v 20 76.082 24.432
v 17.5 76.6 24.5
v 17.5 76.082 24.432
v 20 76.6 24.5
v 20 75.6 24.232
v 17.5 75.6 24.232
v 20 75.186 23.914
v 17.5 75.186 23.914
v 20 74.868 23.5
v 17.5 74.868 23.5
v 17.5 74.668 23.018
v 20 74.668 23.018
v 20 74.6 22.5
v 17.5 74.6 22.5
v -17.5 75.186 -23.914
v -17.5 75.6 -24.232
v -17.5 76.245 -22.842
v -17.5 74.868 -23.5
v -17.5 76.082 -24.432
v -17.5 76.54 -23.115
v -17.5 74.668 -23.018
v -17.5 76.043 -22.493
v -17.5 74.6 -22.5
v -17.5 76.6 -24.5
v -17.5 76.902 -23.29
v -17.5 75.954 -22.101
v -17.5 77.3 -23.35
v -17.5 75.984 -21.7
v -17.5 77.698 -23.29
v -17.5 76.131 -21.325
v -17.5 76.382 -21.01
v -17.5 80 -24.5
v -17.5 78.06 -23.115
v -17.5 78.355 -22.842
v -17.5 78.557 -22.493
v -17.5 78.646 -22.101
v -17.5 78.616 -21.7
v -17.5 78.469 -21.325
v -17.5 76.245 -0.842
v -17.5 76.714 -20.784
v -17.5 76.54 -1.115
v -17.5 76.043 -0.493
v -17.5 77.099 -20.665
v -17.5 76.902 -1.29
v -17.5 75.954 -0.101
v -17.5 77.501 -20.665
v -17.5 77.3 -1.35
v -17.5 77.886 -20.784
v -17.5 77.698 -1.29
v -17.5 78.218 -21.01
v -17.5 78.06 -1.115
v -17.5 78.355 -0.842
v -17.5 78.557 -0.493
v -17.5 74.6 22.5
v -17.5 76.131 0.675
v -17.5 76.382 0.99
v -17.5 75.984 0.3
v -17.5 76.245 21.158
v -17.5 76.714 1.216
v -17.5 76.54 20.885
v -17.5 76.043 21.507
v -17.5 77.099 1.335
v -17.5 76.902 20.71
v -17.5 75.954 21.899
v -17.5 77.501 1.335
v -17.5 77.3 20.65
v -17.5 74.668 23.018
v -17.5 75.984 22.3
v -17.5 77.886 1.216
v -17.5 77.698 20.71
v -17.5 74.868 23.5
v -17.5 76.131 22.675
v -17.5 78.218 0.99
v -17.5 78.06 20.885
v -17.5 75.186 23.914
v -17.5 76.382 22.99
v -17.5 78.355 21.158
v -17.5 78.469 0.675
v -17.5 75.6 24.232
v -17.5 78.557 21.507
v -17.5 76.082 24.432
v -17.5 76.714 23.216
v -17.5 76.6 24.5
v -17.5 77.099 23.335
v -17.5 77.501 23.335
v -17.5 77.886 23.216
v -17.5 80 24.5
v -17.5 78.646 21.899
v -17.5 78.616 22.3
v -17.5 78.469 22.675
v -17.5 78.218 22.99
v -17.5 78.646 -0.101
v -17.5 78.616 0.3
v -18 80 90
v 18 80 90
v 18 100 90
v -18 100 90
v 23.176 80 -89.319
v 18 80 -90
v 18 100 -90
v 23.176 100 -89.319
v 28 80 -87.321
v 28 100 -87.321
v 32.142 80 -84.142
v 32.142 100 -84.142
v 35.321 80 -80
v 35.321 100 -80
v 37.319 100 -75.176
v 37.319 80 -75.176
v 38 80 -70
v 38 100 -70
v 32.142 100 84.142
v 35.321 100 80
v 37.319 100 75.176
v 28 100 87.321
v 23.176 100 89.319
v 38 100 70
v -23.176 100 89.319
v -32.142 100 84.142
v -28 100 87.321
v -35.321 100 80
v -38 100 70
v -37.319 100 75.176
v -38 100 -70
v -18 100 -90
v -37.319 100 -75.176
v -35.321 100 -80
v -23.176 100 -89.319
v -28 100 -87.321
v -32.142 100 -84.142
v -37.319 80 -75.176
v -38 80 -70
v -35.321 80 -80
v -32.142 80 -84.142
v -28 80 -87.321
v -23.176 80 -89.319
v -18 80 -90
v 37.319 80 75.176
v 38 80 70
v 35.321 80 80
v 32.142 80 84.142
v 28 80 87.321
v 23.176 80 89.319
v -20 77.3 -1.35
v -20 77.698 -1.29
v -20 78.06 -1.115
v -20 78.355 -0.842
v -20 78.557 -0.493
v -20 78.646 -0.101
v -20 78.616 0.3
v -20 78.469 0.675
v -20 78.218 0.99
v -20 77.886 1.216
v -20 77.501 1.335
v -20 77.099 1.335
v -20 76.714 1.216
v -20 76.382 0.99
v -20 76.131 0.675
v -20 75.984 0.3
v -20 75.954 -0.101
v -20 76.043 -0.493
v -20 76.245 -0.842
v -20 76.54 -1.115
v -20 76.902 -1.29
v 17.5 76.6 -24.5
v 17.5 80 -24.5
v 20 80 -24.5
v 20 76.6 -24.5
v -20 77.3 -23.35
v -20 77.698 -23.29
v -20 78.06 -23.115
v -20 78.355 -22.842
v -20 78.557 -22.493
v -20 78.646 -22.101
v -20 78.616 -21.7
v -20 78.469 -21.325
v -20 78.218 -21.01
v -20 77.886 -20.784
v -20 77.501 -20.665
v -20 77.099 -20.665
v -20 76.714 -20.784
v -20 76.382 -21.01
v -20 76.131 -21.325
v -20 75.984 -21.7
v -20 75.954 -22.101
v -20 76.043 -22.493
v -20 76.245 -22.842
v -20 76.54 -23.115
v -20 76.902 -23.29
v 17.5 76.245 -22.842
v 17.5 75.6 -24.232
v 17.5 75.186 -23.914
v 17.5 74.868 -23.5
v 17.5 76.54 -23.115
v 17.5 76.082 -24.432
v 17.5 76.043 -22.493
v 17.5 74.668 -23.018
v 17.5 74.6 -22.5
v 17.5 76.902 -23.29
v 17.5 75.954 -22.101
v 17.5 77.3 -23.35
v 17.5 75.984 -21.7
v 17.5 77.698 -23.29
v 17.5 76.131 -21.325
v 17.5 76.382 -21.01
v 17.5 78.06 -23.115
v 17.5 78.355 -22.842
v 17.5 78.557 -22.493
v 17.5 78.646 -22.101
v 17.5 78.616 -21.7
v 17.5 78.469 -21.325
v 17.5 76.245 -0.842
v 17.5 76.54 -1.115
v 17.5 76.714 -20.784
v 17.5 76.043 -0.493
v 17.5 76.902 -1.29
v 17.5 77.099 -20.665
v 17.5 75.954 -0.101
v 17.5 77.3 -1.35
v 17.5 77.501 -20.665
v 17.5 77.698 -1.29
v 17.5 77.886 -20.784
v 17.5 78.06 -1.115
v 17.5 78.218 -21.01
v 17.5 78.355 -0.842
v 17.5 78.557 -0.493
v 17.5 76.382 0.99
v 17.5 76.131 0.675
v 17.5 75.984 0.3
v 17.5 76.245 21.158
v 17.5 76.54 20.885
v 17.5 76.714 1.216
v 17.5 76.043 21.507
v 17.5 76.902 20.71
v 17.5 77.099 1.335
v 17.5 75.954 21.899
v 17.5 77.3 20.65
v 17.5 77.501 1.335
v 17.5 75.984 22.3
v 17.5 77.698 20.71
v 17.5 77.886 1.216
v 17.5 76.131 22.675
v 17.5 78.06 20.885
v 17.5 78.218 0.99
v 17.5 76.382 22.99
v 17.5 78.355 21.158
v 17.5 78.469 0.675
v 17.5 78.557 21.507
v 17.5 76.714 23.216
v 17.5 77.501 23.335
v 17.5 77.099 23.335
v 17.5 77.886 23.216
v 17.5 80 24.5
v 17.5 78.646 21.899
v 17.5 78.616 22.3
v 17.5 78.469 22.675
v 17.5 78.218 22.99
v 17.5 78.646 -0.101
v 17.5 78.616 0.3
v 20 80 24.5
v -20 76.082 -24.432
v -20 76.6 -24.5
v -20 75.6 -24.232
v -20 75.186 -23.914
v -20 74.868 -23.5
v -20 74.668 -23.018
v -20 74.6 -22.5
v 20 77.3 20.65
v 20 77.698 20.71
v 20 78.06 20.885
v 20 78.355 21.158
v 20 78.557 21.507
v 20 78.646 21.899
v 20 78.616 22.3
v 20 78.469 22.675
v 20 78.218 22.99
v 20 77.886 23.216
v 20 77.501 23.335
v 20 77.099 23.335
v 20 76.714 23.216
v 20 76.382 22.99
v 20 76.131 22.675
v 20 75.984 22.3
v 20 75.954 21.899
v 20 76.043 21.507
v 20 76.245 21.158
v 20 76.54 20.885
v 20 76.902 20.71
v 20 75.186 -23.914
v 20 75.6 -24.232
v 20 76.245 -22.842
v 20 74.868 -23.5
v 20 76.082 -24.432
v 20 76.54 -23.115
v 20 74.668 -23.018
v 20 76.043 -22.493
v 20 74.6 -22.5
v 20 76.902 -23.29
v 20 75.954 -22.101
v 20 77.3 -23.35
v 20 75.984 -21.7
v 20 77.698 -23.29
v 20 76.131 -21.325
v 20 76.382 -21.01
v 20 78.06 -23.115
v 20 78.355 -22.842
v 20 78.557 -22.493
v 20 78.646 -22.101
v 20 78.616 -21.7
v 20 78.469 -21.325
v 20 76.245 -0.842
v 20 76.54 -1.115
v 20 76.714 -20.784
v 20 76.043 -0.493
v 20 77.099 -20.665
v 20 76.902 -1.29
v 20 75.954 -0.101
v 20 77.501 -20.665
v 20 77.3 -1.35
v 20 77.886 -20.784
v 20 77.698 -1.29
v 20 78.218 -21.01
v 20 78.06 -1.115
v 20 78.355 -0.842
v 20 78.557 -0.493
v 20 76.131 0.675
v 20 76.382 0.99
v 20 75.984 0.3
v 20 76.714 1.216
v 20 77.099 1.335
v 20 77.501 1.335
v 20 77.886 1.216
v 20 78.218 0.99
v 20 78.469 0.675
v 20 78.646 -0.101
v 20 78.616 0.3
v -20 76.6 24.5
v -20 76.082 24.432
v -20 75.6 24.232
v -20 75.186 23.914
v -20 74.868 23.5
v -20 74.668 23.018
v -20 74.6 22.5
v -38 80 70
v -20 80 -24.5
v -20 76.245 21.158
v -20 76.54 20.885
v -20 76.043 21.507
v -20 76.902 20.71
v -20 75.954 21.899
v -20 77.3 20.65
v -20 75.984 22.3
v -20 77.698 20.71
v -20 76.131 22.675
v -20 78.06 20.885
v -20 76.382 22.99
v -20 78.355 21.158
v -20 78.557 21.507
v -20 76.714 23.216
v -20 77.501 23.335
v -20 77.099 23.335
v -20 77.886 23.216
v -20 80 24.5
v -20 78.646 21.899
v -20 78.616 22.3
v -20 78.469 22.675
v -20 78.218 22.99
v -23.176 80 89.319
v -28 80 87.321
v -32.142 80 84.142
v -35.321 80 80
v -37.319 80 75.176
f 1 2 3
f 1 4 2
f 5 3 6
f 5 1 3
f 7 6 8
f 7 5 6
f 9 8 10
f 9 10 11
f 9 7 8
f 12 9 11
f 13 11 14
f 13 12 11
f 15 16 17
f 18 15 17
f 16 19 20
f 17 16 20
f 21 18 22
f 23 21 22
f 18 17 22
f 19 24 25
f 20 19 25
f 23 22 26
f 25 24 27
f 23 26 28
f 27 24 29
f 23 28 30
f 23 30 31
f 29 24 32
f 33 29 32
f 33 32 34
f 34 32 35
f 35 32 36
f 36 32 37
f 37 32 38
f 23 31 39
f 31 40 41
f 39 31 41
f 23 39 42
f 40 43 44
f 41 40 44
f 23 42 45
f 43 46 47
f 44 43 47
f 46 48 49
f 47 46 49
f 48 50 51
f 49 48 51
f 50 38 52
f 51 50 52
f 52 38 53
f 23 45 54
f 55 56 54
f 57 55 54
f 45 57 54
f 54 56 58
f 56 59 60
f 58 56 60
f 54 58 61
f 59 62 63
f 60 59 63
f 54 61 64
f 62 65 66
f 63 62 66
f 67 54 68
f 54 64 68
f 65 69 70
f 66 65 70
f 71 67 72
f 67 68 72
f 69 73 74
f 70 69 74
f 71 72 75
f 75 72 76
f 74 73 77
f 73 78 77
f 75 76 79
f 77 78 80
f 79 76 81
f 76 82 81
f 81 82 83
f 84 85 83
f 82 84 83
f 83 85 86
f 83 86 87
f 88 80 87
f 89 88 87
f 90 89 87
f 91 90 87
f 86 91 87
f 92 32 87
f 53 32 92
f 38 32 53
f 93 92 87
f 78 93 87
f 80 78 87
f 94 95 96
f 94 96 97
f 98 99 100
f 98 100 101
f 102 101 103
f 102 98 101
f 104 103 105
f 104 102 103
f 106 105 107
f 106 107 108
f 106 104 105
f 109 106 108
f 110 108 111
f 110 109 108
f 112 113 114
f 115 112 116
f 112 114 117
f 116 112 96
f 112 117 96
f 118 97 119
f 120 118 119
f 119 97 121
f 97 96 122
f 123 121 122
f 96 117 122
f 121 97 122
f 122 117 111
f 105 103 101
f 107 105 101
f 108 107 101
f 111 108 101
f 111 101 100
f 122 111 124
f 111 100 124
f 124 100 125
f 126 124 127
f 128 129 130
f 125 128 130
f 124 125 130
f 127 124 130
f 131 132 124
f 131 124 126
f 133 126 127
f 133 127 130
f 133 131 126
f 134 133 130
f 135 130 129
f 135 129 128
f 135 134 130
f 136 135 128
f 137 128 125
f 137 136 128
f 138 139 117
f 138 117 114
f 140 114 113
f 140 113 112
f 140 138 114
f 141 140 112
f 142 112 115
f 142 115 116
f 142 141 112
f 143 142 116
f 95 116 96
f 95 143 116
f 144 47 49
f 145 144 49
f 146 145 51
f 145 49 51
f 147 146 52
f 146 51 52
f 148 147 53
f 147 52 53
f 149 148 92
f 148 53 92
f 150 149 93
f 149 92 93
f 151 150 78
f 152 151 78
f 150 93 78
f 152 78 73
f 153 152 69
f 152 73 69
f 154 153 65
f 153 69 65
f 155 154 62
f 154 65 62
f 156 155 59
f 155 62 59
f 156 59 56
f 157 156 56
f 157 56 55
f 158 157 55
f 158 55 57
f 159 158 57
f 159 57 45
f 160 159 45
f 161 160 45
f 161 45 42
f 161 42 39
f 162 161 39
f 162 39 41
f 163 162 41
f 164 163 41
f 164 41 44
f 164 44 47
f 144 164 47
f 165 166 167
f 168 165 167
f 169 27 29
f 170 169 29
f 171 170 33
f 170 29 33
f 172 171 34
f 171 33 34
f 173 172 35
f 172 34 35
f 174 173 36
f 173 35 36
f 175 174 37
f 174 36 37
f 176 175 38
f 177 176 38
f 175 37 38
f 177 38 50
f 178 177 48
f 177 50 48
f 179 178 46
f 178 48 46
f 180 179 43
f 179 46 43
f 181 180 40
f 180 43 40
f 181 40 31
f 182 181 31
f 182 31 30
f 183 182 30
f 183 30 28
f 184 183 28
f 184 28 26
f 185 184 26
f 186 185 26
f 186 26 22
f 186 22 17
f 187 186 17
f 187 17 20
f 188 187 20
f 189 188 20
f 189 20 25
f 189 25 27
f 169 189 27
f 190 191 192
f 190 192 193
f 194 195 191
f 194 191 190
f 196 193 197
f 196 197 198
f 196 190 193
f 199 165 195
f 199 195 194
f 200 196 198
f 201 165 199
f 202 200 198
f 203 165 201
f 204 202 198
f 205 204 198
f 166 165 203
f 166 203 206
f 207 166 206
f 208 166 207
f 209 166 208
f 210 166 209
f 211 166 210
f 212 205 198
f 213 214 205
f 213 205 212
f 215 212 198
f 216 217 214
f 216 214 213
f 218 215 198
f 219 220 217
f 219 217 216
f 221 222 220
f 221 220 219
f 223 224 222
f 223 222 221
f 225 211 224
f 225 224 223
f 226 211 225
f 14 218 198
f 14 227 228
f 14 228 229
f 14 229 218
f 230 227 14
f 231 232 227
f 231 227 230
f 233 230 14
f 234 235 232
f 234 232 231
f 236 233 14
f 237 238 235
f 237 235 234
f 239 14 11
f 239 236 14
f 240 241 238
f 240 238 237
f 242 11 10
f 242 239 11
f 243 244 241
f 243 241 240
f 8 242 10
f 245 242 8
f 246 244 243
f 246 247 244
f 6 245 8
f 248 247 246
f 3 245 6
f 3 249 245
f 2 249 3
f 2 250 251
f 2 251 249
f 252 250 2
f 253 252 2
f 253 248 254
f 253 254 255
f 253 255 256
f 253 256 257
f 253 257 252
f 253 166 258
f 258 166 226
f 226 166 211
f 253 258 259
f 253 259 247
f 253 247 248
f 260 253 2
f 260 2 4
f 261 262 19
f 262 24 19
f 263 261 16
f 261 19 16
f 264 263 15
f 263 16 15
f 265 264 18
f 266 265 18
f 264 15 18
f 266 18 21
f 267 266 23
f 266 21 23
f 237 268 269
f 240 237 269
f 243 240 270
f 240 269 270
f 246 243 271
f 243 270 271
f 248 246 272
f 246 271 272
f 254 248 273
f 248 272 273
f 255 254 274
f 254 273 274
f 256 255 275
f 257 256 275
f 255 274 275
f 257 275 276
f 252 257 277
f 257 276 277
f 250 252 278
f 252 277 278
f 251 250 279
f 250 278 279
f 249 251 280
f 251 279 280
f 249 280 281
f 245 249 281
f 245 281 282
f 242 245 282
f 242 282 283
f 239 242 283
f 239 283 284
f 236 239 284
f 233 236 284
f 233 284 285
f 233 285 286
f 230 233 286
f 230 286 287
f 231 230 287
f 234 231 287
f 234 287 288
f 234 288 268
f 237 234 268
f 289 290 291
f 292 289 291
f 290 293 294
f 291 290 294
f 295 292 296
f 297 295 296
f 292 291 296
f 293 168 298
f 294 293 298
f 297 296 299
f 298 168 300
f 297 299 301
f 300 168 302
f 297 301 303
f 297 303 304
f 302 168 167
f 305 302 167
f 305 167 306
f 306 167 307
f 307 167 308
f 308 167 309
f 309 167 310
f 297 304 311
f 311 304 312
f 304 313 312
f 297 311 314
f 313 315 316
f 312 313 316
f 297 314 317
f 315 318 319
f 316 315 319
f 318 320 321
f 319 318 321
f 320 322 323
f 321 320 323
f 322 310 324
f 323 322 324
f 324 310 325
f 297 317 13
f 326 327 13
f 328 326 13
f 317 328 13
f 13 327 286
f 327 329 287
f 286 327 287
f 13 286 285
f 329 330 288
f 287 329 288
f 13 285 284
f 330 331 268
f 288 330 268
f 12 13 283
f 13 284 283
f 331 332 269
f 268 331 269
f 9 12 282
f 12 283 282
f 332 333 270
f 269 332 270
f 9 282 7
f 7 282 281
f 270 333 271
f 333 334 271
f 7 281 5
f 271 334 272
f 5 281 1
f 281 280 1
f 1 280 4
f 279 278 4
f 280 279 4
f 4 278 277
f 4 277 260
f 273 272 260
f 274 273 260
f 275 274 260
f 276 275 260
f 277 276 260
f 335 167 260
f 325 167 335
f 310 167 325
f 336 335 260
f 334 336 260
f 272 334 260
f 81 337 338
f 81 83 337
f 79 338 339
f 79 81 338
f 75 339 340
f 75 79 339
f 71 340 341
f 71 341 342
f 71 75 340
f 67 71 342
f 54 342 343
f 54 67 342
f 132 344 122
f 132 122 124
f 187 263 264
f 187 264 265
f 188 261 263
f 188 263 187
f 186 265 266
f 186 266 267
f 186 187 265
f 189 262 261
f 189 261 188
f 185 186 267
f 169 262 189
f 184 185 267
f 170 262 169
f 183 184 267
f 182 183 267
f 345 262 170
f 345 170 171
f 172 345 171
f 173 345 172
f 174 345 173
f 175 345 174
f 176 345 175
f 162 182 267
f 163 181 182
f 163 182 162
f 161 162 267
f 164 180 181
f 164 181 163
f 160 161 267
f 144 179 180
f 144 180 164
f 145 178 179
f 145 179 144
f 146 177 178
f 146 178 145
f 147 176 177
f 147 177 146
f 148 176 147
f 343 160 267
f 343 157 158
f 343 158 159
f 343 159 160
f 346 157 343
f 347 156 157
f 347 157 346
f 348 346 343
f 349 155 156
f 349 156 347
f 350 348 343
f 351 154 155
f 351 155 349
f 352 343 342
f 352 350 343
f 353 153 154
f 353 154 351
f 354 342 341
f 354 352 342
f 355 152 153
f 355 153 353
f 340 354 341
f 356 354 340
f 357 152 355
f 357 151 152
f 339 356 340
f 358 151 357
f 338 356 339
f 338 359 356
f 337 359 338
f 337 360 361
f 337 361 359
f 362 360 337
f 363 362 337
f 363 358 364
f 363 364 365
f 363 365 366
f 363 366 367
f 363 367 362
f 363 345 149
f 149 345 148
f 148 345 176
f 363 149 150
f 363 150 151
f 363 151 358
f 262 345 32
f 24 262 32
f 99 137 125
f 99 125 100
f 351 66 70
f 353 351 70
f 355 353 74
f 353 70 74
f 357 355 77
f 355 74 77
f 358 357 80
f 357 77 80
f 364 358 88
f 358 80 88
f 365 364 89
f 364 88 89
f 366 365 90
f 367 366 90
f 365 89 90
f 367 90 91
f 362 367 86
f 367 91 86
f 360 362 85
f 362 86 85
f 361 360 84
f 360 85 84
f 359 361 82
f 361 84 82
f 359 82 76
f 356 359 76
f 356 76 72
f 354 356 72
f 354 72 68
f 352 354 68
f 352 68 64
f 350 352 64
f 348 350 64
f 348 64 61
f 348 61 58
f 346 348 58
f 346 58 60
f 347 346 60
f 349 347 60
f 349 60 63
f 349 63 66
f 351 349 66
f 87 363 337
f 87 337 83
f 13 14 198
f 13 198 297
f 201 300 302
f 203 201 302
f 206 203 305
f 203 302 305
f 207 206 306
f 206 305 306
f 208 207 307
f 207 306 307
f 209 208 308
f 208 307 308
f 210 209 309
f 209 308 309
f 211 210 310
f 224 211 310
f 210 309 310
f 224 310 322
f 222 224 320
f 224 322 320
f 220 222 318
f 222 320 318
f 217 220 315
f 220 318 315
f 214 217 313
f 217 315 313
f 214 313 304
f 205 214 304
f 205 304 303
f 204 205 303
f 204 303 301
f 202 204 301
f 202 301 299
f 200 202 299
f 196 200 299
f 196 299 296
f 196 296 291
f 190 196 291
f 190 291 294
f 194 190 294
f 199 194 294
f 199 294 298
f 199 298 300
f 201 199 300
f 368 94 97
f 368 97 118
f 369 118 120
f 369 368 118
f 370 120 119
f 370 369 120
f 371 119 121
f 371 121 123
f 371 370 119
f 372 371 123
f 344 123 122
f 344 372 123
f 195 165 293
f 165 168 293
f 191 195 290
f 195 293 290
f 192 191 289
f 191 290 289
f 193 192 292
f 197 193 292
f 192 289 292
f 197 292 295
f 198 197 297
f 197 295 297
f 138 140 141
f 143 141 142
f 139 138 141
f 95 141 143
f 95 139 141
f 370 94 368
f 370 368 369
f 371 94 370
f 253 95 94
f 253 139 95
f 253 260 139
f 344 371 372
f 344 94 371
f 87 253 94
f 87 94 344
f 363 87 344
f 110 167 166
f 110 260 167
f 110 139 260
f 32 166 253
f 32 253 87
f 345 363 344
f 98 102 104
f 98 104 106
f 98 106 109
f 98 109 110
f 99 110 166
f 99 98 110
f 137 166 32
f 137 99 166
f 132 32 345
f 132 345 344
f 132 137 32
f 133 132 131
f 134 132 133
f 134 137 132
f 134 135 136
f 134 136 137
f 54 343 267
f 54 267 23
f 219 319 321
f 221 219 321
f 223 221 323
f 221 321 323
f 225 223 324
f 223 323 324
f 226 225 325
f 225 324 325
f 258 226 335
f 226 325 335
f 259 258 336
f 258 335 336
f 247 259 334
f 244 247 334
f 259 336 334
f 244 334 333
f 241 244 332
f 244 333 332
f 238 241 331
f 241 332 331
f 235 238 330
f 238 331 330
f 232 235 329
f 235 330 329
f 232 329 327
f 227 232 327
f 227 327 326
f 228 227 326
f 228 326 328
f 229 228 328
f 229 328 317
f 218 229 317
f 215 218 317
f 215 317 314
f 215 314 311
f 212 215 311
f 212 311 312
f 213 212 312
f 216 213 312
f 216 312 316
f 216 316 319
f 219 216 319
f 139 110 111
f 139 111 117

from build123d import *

# Parameters (mm, degrees)
SKETCH1_R                = 38
BOSS_EXTRUDE1_DEPTH      = 80
SKETCH2_R                = 29
CUT_EXTRUDE1_DEPTH       = 75
BOSS_EXTRUDE2_DEPTH      = 20
ESBO_O1_W                = 76
ESBO_O1_H                = 80
CORTE_EXTRUS_O1_DEPTH    = 155.518607294
ESBO_O2_W                = 2.5
ESBO_O2_H                = 49
RESSALTO_EXTRUS_O1_DEPTH = 5.4
ESBO_O3_R                = 1.35
CORTE_EXTRUS_O2_DEPTH    = 147.505972574
FILETE1_R                = 2


with BuildPart() as part:
    # Sketch1 → Boss-Extrude1 (new body)
    with BuildSketch(Plane(origin=(0, 0, 0), x_dir=(1, 0, 0), z_dir=(0, 1, 0))):
        with Locations(Location((0, 0, 0), (0, 0, 270))):
            Circle(SKETCH1_R)
    extrude(amount=BOSS_EXTRUDE1_DEPTH)

    # Sketch2 → Cut-Extrude1 (cut)
    with BuildSketch(Plane.XZ):
        with Locations(Location((0, 0, 0), (0, 0, 270))):
            Circle(SKETCH2_R)
    extrude(amount=-CUT_EXTRUDE1_DEPTH, mode=Mode.SUBTRACT)

    # Sketch3 → Boss-Extrude2 (add)
    with BuildSketch(Plane(origin=(0, 80, 0), x_dir=(1, 0, 0), z_dir=(0, 1, 0))):
        with BuildLine():
            Line((18, -90), (-18, -90))
            ThreePointArc((-18, -90), (-32.142135624, -84.142135624), (-38, -70))
            Line((-38, -70), (-38, 70))
            ThreePointArc((-38, 70), (-32.142135624, 84.142135624), (-18, 90))
            Line((-18, 90), (18, 90))
            ThreePointArc((18, 90), (32.142135624, 84.142135624), (38, 70))
            Line((38, 70), (38, -70))
            ThreePointArc((38, -70), (32.142135624, -84.142135624), (18, -90))
        make_face()
    extrude(amount=BOSS_EXTRUDE2_DEPTH)

    # Esboço1 → Corte-extrusão1 (cut, through all)
    with BuildSketch(Plane(origin=(38, 0, 0), x_dir=(0, 0, -1), z_dir=(1, 0, 0))):
        with Locations((0, 40)):
            Rectangle(ESBO_O1_W, ESBO_O1_H)
    extrude(amount=-CORTE_EXTRUS_O1_DEPTH, mode=Mode.SUBTRACT)

    # Esboço2 → Ressalto-extrusão1 (add)
    with BuildSketch(Plane.XZ.offset(-80)):
        with Locations((18.75, 0)):
            Rectangle(ESBO_O2_W, ESBO_O2_H)
        with Locations((-18.75, 0)):
            Rectangle(ESBO_O2_W, ESBO_O2_H)
    extrude(amount=RESSALTO_EXTRUS_O1_DEPTH)

    # Esboço3 → Corte-extrusão2 (cut, through all)
    with BuildSketch(Plane(origin=(20, 0, 0), x_dir=(0, 0, -1), z_dir=(1, 0, 0))):
        with Locations((22, 77.3)):
            Circle(ESBO_O3_R)
        with Locations((0, 77.3)):
            Circle(ESBO_O3_R)
        with Locations((-22, 77.3)):
            Circle(ESBO_O3_R)
    extrude(amount=-CORTE_EXTRUS_O2_DEPTH, mode=Mode.SUBTRACT)

    # Filete1
    filete1_edges = [part.edges().sort_by_distance(p)[0] for p in [
        (18.75, 74.6, -24.5),
        (18.75, 74.6, 24.5),
        (-18.75, 74.6, -24.5),
        (-18.75, 74.6, 24.5),
    ]]
    fillet(filete1_edges, radius=FILETE1_R)


solid = part.part
